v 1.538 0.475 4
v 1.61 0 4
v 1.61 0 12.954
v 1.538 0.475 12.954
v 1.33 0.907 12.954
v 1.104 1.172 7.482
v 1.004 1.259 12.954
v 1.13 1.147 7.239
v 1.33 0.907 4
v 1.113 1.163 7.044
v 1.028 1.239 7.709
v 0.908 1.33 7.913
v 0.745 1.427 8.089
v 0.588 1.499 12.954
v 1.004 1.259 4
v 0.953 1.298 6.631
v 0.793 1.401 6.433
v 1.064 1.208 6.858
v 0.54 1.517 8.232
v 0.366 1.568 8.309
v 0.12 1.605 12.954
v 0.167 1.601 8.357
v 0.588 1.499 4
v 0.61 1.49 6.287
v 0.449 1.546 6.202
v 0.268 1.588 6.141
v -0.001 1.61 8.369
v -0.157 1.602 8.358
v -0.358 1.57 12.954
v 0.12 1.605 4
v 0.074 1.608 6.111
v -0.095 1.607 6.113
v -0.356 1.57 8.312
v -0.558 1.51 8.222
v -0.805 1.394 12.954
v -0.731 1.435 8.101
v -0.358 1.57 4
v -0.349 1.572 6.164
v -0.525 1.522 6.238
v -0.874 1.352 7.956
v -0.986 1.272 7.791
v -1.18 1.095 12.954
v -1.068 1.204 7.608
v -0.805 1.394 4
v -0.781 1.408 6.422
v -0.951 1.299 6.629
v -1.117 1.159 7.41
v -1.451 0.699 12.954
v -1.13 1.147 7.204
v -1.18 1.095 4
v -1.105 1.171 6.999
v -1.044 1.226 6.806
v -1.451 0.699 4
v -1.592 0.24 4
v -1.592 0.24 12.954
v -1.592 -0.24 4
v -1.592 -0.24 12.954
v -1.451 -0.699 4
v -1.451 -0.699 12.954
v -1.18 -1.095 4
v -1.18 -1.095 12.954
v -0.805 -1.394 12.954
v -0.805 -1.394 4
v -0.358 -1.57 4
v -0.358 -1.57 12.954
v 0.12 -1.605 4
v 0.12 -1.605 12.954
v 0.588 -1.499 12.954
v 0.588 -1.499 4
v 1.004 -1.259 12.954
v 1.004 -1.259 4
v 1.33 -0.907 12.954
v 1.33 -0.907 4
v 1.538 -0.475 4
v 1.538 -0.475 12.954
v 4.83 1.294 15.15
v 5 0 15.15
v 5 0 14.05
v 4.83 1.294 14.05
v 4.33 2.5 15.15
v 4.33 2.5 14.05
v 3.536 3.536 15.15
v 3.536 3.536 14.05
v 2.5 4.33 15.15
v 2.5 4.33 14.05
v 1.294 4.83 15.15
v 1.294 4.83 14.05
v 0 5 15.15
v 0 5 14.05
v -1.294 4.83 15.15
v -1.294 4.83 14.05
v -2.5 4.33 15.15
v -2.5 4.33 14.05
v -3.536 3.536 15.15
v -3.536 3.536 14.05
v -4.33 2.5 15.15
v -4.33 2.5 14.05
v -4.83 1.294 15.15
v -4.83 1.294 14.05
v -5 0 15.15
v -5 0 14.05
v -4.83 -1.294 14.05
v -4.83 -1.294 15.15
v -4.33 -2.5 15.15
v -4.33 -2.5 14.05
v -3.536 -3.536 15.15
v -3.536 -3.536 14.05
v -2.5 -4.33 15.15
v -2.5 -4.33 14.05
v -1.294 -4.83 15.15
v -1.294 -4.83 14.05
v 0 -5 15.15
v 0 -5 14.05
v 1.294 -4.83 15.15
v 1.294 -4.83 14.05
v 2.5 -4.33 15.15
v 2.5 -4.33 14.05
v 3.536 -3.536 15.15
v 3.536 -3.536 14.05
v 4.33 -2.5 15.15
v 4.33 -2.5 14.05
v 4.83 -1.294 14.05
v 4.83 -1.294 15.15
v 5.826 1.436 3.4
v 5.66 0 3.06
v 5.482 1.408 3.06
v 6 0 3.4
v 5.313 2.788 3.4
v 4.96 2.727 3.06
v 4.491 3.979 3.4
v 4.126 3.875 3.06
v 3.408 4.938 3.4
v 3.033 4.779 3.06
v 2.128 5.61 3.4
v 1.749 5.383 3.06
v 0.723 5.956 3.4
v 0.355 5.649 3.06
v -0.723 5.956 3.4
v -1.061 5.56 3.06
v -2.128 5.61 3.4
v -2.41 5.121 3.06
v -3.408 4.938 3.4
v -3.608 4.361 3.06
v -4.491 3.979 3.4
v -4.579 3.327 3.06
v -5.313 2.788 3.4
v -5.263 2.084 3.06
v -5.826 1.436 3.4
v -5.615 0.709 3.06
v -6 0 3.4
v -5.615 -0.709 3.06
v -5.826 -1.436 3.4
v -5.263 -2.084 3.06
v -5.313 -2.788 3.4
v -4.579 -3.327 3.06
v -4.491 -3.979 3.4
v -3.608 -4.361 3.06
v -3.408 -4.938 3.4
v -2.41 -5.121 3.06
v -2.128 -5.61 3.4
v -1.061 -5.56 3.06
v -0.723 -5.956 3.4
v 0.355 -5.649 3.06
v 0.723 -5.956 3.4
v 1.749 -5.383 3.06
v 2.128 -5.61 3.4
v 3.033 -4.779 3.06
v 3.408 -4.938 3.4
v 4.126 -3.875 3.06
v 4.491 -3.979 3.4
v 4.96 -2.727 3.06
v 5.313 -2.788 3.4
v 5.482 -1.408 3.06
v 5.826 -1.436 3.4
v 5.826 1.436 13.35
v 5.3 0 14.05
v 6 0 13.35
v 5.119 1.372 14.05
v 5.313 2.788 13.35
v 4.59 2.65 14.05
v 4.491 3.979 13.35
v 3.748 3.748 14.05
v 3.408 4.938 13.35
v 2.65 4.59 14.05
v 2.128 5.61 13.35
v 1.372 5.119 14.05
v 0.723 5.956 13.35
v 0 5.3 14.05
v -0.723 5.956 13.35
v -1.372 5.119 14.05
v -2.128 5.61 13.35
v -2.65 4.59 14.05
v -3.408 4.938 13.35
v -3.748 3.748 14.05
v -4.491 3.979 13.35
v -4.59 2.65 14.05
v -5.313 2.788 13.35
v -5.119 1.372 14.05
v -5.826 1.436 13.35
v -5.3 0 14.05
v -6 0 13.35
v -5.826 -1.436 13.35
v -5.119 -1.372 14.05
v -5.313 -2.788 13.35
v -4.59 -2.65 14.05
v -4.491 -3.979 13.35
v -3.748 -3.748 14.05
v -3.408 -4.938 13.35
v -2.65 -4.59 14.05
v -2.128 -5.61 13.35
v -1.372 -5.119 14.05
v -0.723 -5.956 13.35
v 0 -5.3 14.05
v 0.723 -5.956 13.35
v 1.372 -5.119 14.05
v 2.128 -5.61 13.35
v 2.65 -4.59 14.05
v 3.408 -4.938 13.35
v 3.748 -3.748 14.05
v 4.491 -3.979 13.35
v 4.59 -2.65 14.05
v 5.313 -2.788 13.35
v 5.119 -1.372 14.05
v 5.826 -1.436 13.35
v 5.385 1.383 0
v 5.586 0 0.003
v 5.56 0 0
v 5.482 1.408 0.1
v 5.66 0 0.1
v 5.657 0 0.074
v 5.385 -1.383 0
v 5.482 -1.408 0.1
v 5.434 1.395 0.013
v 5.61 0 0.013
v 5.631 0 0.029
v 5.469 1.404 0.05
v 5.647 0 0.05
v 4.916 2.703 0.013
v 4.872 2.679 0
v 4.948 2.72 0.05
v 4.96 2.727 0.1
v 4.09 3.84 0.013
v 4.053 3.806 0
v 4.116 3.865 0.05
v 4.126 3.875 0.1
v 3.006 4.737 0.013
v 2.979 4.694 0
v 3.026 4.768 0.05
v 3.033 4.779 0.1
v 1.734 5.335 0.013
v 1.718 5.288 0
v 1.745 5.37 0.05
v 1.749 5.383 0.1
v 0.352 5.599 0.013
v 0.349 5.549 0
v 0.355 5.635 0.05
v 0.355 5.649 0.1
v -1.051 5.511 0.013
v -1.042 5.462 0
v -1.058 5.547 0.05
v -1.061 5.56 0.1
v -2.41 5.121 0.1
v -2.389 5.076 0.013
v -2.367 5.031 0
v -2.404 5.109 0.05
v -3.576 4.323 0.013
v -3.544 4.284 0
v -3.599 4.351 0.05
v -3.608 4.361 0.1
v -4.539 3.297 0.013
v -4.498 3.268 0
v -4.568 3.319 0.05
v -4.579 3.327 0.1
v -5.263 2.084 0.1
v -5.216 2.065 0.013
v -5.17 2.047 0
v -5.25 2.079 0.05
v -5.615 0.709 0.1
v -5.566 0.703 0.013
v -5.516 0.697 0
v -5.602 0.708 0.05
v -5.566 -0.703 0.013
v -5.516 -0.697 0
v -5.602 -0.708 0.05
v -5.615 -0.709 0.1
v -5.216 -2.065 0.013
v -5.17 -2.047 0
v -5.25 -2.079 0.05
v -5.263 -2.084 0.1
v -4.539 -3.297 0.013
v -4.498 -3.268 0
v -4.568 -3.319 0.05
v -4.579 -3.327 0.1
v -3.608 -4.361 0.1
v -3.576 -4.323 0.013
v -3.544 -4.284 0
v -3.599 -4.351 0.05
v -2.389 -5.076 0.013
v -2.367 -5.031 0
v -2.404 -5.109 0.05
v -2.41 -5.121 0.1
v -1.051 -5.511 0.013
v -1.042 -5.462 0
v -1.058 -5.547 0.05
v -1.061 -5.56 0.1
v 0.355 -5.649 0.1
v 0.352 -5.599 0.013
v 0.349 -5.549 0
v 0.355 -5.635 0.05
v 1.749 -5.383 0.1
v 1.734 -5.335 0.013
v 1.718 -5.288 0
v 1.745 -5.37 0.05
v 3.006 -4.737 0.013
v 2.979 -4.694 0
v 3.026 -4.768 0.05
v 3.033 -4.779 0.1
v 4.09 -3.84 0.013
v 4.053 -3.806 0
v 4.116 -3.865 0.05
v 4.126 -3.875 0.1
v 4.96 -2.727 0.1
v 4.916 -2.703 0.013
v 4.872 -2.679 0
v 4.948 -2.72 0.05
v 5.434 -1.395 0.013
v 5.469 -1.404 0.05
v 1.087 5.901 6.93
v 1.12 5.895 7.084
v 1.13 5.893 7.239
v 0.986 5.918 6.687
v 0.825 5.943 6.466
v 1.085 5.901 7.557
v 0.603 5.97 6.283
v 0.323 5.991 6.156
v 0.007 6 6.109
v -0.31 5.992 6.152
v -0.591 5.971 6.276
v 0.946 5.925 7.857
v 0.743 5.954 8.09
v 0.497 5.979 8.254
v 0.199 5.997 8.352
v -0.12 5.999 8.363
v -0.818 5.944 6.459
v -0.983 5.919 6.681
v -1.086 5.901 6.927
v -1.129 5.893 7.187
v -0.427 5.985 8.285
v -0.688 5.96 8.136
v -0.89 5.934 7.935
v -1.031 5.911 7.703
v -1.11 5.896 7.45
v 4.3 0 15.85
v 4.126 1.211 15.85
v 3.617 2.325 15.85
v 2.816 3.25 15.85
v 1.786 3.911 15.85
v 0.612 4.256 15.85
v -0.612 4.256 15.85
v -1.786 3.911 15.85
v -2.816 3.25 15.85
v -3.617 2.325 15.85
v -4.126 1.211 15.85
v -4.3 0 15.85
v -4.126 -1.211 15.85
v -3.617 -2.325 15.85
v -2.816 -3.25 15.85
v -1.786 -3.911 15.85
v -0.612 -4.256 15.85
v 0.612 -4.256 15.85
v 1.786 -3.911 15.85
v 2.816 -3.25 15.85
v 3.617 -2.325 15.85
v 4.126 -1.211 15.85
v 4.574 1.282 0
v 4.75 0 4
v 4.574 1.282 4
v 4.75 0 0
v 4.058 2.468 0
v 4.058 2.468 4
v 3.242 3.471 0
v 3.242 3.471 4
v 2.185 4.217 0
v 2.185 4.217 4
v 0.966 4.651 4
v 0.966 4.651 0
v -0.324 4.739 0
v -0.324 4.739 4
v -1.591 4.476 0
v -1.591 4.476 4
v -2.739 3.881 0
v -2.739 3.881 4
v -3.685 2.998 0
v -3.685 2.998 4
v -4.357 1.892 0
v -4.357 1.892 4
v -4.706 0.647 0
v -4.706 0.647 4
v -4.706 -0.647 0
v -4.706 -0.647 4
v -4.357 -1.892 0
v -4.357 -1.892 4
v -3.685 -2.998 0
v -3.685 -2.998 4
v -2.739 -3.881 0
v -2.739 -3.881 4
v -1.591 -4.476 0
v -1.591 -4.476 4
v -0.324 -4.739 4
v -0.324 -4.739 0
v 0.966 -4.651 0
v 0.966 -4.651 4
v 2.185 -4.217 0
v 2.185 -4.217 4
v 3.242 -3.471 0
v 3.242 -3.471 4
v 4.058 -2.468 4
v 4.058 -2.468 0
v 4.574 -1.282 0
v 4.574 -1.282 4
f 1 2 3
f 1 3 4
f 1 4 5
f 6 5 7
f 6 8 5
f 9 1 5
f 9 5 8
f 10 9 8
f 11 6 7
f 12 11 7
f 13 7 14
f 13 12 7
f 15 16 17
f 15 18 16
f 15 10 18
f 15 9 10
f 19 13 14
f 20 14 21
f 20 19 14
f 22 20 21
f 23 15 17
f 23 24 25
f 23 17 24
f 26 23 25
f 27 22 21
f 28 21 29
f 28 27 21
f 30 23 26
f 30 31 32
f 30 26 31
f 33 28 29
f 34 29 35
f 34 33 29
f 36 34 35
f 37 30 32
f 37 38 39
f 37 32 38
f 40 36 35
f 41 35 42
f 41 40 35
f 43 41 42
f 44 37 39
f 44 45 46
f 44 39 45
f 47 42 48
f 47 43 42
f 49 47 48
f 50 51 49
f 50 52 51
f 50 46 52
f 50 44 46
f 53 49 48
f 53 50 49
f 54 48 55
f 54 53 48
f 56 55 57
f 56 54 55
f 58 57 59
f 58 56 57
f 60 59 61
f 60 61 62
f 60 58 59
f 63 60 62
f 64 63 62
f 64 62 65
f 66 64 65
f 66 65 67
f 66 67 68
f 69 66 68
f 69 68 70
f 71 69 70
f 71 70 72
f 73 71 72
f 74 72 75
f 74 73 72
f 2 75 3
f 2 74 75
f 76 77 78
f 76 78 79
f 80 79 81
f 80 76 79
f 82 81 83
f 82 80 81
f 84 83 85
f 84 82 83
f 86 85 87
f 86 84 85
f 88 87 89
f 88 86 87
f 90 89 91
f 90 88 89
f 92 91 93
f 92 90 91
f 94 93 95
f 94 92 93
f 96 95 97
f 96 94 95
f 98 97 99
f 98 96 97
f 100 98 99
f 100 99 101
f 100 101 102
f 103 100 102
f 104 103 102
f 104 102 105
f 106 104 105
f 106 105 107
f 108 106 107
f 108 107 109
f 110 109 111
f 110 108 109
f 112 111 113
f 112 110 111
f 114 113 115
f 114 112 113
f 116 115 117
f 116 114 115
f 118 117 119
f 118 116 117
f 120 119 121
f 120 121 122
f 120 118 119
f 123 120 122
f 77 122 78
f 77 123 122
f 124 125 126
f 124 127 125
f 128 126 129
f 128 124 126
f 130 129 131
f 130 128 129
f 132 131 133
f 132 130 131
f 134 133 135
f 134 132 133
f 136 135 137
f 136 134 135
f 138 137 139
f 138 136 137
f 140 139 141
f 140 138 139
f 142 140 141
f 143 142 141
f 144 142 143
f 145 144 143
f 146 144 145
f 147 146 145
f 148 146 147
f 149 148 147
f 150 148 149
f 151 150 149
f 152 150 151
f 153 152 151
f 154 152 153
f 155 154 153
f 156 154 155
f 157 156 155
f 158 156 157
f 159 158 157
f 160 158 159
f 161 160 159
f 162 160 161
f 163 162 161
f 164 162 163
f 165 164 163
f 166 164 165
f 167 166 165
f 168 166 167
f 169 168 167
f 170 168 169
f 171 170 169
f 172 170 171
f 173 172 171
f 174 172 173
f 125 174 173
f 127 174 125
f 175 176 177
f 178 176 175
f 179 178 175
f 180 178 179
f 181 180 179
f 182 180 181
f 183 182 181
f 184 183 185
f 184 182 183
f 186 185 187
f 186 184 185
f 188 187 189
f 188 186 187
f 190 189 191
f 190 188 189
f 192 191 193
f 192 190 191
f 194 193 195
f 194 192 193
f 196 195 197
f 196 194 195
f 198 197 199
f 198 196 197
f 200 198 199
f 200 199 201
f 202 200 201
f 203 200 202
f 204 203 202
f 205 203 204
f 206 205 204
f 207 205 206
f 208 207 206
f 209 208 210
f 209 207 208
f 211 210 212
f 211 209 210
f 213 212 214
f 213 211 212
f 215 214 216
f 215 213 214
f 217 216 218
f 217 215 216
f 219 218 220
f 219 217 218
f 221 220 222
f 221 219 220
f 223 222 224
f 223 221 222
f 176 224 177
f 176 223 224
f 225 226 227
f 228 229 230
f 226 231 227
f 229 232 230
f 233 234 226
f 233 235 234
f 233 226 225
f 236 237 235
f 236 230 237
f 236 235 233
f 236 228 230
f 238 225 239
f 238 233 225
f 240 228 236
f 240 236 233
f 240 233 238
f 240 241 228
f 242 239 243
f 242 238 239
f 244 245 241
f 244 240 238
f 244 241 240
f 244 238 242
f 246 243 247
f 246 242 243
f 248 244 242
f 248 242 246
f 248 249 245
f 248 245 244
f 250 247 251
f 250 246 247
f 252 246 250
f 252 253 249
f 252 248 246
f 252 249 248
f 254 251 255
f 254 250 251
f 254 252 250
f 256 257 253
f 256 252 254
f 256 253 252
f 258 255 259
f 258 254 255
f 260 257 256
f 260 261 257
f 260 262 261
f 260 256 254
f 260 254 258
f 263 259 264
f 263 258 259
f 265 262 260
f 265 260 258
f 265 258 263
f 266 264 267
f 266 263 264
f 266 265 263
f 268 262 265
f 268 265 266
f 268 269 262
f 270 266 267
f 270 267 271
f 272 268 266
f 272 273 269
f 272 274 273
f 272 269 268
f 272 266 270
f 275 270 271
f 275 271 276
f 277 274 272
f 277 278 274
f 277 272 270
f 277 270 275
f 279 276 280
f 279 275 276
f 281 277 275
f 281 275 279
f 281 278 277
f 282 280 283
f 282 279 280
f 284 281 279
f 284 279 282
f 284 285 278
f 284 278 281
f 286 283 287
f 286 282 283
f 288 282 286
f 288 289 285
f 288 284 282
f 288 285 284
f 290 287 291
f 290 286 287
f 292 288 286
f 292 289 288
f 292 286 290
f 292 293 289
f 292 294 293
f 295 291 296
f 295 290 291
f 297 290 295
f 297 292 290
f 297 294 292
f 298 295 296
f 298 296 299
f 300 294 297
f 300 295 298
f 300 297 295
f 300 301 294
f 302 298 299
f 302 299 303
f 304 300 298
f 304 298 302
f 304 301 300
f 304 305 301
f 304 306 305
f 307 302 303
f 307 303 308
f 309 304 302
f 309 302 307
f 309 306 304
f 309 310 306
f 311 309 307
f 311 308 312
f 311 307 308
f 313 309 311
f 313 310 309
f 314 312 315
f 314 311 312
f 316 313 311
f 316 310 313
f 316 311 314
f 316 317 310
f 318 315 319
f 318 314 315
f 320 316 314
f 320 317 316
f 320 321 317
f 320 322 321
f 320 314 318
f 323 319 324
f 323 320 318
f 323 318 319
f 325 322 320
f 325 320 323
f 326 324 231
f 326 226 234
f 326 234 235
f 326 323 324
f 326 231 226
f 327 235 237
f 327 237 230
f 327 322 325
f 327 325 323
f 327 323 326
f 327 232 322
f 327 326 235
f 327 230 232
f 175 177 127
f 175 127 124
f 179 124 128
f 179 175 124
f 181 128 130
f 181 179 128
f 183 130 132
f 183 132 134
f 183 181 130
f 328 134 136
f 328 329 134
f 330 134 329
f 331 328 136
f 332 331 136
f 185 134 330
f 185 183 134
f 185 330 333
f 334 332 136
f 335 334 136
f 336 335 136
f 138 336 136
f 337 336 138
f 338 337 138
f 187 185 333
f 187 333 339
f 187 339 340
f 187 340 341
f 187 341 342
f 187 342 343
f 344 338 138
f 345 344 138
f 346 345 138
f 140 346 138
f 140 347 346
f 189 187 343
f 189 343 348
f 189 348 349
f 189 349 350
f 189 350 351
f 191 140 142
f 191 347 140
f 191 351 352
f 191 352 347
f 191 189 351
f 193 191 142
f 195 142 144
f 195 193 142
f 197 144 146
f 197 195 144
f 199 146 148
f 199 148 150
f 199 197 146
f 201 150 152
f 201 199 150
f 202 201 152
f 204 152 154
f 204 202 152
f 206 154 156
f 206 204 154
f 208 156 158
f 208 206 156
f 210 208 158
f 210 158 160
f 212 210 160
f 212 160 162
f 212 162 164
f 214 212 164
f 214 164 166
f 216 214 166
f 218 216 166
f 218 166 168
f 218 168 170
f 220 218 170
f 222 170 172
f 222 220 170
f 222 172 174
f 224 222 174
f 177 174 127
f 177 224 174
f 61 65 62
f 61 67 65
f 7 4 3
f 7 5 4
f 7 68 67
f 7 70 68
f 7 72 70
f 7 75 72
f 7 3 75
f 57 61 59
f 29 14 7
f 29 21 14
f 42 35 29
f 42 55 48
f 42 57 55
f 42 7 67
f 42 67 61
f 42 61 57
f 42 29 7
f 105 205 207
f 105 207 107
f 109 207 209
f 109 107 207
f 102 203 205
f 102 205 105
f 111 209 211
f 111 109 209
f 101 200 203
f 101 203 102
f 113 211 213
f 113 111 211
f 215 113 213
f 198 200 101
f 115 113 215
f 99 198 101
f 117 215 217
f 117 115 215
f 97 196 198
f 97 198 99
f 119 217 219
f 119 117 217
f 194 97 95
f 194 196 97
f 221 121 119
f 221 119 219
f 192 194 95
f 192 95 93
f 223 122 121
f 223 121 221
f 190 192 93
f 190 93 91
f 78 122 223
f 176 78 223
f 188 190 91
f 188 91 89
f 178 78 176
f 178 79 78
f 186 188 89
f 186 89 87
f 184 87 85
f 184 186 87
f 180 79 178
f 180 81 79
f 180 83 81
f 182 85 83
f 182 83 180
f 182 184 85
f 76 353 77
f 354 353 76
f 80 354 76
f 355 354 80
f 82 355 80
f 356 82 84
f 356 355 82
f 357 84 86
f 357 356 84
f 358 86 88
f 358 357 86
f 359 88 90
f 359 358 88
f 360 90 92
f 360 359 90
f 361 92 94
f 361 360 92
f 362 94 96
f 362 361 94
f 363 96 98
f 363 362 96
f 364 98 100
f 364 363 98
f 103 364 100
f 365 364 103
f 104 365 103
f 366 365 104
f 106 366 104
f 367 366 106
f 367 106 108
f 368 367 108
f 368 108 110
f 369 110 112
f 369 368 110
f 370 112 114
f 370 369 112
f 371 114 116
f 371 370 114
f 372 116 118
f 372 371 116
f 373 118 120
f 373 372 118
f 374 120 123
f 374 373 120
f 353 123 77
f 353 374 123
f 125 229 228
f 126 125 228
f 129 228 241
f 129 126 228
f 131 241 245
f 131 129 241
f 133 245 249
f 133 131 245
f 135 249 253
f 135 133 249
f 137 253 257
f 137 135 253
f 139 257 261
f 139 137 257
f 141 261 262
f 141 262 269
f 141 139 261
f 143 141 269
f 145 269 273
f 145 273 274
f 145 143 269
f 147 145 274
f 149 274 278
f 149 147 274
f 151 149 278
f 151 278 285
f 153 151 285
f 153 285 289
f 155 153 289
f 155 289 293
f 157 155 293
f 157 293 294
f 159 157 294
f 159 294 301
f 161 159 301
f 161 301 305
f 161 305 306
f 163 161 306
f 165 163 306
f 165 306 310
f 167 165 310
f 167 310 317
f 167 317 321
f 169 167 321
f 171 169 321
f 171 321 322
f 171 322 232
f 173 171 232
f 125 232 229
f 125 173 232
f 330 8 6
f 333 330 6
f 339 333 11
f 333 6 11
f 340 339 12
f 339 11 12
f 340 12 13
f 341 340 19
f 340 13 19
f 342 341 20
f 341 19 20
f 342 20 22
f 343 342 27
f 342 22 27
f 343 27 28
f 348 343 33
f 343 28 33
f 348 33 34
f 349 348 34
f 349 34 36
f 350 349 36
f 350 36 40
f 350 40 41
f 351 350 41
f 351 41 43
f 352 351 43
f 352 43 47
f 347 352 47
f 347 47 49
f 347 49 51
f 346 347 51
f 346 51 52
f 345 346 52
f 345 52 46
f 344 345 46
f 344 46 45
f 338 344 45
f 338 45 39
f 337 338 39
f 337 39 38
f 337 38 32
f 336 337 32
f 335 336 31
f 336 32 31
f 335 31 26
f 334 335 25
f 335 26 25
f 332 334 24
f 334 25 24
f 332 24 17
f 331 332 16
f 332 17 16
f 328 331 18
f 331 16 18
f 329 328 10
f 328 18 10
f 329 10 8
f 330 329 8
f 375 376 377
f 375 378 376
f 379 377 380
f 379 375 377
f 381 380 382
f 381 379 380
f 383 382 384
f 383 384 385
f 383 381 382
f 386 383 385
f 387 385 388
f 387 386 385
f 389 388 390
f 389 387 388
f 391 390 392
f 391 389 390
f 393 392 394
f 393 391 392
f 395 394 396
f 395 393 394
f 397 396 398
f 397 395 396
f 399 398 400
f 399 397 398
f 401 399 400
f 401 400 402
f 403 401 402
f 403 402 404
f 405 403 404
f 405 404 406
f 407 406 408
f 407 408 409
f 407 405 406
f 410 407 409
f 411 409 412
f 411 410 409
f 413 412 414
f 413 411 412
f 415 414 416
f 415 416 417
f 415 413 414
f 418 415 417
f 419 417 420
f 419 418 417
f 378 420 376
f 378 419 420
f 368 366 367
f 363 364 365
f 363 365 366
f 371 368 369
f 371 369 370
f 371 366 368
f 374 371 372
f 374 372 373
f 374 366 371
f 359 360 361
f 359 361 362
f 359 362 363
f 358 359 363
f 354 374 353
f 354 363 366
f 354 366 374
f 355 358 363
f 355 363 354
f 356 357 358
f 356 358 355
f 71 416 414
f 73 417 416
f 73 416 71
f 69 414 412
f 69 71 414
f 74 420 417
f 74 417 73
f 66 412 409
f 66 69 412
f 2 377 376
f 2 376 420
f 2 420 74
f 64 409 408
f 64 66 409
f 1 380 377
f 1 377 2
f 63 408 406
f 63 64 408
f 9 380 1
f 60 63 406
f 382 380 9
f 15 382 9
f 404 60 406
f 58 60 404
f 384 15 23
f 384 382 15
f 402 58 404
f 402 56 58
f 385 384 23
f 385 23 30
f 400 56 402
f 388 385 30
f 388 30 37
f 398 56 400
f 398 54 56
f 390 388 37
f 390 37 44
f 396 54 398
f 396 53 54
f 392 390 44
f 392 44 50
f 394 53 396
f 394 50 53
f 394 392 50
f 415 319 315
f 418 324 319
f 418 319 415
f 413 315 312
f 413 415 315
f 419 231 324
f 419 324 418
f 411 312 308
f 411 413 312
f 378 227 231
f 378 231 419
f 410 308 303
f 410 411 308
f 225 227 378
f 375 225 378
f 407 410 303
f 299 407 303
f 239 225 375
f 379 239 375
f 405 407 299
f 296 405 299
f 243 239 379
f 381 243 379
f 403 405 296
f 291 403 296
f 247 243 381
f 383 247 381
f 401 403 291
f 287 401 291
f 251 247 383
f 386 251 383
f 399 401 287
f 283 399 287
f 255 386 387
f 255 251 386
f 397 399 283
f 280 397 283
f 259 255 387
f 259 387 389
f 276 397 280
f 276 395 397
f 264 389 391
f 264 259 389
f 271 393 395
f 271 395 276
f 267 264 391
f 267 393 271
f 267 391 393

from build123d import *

# Parameters (mm, degrees)
F2_S7_R     = 5.66
F2_T8_DEPTH = 10
F3_R        = 0.1
F4_D        = 2.2606
F4_DEPTH    = 6.001


# Not quite as in the source:
# - a fillet or chamfer that OpenCascade refuses, or shapes differently, is made with other operations: its cross-section is extruded or revolved along the edge and cut away or added


with BuildPart() as f1:
    # F0 (on Front) → F1 (revolve)
    with BuildSketch(Plane.XZ):
        Polygon((4.75, 4), (4.75, 0), (5.66, 0), (5.66, 2.7), (6, 2.7), (6, 14.05), (5, 14.05), (5, 15.85), (0, 15.85), (0, 12.954), (1.61, 12.954), (1.61, 4), align=None)
    revolve(axis=Axis((0, 0, 9.925), (0, 0, 1)))

    # F2: chamfer of 0.7 on 3 edges, made by hand

    # F2_s1 → F2_t2 (revolve, cut)
    with BuildSketch(Plane.XZ):
        Polygon((6, 13.35), (5.3, 14.05), (6, 14.05), align=None)
    revolve(axis=Axis((0, 0, 14.05), (0, 0, 1)), mode=Mode.SUBTRACT)


with BuildPart() as f2_tool4:
    # F2_s5 → F2_t6 (revolve)
    with BuildSketch(Plane.XZ):
        Polygon((5.3, 2.7), (6, 3.4), (6, 2.7), align=None)
    revolve(axis=Axis((0, 0, 2.7), (0, 0, 1)))

    # F2_s7 → F2_t8 (cut, symmetric)
    with BuildSketch(Plane.XY.offset(3.1)):
        Circle(F2_S7_R)
    extrude(amount=F2_T8_DEPTH, both=True, mode=Mode.SUBTRACT)


with BuildPart() as f1_1:
    add(f1.part)

    # F2_t3: cut F2_tool4
    add(f2_tool4.part, mode=Mode.SUBTRACT)

    # F2_s9 → F2_t10 (revolve, cut)
    with BuildSketch(Plane.XZ):
        Polygon((5, 15.15), (4.3, 15.85), (5, 15.85), align=None)
    revolve(axis=Axis((0, 0, 15.85), (0, 0, 1)), mode=Mode.SUBTRACT)

    # F3
    f3_edges = [f1_1.edges().sort_by_distance(p)[0] for p in [
        (-5.66, 0, 0),
    ]]
    fillet(f3_edges, radius=F3_R)

    # F4 (through all, one way)
    with BuildSketch(Plane.XZ):
        with Locations((0, 7.239)):
            Circle(F4_D / 2)
    extrude(amount=-F4_DEPTH, mode=Mode.SUBTRACT)


solid = f1_1.part
